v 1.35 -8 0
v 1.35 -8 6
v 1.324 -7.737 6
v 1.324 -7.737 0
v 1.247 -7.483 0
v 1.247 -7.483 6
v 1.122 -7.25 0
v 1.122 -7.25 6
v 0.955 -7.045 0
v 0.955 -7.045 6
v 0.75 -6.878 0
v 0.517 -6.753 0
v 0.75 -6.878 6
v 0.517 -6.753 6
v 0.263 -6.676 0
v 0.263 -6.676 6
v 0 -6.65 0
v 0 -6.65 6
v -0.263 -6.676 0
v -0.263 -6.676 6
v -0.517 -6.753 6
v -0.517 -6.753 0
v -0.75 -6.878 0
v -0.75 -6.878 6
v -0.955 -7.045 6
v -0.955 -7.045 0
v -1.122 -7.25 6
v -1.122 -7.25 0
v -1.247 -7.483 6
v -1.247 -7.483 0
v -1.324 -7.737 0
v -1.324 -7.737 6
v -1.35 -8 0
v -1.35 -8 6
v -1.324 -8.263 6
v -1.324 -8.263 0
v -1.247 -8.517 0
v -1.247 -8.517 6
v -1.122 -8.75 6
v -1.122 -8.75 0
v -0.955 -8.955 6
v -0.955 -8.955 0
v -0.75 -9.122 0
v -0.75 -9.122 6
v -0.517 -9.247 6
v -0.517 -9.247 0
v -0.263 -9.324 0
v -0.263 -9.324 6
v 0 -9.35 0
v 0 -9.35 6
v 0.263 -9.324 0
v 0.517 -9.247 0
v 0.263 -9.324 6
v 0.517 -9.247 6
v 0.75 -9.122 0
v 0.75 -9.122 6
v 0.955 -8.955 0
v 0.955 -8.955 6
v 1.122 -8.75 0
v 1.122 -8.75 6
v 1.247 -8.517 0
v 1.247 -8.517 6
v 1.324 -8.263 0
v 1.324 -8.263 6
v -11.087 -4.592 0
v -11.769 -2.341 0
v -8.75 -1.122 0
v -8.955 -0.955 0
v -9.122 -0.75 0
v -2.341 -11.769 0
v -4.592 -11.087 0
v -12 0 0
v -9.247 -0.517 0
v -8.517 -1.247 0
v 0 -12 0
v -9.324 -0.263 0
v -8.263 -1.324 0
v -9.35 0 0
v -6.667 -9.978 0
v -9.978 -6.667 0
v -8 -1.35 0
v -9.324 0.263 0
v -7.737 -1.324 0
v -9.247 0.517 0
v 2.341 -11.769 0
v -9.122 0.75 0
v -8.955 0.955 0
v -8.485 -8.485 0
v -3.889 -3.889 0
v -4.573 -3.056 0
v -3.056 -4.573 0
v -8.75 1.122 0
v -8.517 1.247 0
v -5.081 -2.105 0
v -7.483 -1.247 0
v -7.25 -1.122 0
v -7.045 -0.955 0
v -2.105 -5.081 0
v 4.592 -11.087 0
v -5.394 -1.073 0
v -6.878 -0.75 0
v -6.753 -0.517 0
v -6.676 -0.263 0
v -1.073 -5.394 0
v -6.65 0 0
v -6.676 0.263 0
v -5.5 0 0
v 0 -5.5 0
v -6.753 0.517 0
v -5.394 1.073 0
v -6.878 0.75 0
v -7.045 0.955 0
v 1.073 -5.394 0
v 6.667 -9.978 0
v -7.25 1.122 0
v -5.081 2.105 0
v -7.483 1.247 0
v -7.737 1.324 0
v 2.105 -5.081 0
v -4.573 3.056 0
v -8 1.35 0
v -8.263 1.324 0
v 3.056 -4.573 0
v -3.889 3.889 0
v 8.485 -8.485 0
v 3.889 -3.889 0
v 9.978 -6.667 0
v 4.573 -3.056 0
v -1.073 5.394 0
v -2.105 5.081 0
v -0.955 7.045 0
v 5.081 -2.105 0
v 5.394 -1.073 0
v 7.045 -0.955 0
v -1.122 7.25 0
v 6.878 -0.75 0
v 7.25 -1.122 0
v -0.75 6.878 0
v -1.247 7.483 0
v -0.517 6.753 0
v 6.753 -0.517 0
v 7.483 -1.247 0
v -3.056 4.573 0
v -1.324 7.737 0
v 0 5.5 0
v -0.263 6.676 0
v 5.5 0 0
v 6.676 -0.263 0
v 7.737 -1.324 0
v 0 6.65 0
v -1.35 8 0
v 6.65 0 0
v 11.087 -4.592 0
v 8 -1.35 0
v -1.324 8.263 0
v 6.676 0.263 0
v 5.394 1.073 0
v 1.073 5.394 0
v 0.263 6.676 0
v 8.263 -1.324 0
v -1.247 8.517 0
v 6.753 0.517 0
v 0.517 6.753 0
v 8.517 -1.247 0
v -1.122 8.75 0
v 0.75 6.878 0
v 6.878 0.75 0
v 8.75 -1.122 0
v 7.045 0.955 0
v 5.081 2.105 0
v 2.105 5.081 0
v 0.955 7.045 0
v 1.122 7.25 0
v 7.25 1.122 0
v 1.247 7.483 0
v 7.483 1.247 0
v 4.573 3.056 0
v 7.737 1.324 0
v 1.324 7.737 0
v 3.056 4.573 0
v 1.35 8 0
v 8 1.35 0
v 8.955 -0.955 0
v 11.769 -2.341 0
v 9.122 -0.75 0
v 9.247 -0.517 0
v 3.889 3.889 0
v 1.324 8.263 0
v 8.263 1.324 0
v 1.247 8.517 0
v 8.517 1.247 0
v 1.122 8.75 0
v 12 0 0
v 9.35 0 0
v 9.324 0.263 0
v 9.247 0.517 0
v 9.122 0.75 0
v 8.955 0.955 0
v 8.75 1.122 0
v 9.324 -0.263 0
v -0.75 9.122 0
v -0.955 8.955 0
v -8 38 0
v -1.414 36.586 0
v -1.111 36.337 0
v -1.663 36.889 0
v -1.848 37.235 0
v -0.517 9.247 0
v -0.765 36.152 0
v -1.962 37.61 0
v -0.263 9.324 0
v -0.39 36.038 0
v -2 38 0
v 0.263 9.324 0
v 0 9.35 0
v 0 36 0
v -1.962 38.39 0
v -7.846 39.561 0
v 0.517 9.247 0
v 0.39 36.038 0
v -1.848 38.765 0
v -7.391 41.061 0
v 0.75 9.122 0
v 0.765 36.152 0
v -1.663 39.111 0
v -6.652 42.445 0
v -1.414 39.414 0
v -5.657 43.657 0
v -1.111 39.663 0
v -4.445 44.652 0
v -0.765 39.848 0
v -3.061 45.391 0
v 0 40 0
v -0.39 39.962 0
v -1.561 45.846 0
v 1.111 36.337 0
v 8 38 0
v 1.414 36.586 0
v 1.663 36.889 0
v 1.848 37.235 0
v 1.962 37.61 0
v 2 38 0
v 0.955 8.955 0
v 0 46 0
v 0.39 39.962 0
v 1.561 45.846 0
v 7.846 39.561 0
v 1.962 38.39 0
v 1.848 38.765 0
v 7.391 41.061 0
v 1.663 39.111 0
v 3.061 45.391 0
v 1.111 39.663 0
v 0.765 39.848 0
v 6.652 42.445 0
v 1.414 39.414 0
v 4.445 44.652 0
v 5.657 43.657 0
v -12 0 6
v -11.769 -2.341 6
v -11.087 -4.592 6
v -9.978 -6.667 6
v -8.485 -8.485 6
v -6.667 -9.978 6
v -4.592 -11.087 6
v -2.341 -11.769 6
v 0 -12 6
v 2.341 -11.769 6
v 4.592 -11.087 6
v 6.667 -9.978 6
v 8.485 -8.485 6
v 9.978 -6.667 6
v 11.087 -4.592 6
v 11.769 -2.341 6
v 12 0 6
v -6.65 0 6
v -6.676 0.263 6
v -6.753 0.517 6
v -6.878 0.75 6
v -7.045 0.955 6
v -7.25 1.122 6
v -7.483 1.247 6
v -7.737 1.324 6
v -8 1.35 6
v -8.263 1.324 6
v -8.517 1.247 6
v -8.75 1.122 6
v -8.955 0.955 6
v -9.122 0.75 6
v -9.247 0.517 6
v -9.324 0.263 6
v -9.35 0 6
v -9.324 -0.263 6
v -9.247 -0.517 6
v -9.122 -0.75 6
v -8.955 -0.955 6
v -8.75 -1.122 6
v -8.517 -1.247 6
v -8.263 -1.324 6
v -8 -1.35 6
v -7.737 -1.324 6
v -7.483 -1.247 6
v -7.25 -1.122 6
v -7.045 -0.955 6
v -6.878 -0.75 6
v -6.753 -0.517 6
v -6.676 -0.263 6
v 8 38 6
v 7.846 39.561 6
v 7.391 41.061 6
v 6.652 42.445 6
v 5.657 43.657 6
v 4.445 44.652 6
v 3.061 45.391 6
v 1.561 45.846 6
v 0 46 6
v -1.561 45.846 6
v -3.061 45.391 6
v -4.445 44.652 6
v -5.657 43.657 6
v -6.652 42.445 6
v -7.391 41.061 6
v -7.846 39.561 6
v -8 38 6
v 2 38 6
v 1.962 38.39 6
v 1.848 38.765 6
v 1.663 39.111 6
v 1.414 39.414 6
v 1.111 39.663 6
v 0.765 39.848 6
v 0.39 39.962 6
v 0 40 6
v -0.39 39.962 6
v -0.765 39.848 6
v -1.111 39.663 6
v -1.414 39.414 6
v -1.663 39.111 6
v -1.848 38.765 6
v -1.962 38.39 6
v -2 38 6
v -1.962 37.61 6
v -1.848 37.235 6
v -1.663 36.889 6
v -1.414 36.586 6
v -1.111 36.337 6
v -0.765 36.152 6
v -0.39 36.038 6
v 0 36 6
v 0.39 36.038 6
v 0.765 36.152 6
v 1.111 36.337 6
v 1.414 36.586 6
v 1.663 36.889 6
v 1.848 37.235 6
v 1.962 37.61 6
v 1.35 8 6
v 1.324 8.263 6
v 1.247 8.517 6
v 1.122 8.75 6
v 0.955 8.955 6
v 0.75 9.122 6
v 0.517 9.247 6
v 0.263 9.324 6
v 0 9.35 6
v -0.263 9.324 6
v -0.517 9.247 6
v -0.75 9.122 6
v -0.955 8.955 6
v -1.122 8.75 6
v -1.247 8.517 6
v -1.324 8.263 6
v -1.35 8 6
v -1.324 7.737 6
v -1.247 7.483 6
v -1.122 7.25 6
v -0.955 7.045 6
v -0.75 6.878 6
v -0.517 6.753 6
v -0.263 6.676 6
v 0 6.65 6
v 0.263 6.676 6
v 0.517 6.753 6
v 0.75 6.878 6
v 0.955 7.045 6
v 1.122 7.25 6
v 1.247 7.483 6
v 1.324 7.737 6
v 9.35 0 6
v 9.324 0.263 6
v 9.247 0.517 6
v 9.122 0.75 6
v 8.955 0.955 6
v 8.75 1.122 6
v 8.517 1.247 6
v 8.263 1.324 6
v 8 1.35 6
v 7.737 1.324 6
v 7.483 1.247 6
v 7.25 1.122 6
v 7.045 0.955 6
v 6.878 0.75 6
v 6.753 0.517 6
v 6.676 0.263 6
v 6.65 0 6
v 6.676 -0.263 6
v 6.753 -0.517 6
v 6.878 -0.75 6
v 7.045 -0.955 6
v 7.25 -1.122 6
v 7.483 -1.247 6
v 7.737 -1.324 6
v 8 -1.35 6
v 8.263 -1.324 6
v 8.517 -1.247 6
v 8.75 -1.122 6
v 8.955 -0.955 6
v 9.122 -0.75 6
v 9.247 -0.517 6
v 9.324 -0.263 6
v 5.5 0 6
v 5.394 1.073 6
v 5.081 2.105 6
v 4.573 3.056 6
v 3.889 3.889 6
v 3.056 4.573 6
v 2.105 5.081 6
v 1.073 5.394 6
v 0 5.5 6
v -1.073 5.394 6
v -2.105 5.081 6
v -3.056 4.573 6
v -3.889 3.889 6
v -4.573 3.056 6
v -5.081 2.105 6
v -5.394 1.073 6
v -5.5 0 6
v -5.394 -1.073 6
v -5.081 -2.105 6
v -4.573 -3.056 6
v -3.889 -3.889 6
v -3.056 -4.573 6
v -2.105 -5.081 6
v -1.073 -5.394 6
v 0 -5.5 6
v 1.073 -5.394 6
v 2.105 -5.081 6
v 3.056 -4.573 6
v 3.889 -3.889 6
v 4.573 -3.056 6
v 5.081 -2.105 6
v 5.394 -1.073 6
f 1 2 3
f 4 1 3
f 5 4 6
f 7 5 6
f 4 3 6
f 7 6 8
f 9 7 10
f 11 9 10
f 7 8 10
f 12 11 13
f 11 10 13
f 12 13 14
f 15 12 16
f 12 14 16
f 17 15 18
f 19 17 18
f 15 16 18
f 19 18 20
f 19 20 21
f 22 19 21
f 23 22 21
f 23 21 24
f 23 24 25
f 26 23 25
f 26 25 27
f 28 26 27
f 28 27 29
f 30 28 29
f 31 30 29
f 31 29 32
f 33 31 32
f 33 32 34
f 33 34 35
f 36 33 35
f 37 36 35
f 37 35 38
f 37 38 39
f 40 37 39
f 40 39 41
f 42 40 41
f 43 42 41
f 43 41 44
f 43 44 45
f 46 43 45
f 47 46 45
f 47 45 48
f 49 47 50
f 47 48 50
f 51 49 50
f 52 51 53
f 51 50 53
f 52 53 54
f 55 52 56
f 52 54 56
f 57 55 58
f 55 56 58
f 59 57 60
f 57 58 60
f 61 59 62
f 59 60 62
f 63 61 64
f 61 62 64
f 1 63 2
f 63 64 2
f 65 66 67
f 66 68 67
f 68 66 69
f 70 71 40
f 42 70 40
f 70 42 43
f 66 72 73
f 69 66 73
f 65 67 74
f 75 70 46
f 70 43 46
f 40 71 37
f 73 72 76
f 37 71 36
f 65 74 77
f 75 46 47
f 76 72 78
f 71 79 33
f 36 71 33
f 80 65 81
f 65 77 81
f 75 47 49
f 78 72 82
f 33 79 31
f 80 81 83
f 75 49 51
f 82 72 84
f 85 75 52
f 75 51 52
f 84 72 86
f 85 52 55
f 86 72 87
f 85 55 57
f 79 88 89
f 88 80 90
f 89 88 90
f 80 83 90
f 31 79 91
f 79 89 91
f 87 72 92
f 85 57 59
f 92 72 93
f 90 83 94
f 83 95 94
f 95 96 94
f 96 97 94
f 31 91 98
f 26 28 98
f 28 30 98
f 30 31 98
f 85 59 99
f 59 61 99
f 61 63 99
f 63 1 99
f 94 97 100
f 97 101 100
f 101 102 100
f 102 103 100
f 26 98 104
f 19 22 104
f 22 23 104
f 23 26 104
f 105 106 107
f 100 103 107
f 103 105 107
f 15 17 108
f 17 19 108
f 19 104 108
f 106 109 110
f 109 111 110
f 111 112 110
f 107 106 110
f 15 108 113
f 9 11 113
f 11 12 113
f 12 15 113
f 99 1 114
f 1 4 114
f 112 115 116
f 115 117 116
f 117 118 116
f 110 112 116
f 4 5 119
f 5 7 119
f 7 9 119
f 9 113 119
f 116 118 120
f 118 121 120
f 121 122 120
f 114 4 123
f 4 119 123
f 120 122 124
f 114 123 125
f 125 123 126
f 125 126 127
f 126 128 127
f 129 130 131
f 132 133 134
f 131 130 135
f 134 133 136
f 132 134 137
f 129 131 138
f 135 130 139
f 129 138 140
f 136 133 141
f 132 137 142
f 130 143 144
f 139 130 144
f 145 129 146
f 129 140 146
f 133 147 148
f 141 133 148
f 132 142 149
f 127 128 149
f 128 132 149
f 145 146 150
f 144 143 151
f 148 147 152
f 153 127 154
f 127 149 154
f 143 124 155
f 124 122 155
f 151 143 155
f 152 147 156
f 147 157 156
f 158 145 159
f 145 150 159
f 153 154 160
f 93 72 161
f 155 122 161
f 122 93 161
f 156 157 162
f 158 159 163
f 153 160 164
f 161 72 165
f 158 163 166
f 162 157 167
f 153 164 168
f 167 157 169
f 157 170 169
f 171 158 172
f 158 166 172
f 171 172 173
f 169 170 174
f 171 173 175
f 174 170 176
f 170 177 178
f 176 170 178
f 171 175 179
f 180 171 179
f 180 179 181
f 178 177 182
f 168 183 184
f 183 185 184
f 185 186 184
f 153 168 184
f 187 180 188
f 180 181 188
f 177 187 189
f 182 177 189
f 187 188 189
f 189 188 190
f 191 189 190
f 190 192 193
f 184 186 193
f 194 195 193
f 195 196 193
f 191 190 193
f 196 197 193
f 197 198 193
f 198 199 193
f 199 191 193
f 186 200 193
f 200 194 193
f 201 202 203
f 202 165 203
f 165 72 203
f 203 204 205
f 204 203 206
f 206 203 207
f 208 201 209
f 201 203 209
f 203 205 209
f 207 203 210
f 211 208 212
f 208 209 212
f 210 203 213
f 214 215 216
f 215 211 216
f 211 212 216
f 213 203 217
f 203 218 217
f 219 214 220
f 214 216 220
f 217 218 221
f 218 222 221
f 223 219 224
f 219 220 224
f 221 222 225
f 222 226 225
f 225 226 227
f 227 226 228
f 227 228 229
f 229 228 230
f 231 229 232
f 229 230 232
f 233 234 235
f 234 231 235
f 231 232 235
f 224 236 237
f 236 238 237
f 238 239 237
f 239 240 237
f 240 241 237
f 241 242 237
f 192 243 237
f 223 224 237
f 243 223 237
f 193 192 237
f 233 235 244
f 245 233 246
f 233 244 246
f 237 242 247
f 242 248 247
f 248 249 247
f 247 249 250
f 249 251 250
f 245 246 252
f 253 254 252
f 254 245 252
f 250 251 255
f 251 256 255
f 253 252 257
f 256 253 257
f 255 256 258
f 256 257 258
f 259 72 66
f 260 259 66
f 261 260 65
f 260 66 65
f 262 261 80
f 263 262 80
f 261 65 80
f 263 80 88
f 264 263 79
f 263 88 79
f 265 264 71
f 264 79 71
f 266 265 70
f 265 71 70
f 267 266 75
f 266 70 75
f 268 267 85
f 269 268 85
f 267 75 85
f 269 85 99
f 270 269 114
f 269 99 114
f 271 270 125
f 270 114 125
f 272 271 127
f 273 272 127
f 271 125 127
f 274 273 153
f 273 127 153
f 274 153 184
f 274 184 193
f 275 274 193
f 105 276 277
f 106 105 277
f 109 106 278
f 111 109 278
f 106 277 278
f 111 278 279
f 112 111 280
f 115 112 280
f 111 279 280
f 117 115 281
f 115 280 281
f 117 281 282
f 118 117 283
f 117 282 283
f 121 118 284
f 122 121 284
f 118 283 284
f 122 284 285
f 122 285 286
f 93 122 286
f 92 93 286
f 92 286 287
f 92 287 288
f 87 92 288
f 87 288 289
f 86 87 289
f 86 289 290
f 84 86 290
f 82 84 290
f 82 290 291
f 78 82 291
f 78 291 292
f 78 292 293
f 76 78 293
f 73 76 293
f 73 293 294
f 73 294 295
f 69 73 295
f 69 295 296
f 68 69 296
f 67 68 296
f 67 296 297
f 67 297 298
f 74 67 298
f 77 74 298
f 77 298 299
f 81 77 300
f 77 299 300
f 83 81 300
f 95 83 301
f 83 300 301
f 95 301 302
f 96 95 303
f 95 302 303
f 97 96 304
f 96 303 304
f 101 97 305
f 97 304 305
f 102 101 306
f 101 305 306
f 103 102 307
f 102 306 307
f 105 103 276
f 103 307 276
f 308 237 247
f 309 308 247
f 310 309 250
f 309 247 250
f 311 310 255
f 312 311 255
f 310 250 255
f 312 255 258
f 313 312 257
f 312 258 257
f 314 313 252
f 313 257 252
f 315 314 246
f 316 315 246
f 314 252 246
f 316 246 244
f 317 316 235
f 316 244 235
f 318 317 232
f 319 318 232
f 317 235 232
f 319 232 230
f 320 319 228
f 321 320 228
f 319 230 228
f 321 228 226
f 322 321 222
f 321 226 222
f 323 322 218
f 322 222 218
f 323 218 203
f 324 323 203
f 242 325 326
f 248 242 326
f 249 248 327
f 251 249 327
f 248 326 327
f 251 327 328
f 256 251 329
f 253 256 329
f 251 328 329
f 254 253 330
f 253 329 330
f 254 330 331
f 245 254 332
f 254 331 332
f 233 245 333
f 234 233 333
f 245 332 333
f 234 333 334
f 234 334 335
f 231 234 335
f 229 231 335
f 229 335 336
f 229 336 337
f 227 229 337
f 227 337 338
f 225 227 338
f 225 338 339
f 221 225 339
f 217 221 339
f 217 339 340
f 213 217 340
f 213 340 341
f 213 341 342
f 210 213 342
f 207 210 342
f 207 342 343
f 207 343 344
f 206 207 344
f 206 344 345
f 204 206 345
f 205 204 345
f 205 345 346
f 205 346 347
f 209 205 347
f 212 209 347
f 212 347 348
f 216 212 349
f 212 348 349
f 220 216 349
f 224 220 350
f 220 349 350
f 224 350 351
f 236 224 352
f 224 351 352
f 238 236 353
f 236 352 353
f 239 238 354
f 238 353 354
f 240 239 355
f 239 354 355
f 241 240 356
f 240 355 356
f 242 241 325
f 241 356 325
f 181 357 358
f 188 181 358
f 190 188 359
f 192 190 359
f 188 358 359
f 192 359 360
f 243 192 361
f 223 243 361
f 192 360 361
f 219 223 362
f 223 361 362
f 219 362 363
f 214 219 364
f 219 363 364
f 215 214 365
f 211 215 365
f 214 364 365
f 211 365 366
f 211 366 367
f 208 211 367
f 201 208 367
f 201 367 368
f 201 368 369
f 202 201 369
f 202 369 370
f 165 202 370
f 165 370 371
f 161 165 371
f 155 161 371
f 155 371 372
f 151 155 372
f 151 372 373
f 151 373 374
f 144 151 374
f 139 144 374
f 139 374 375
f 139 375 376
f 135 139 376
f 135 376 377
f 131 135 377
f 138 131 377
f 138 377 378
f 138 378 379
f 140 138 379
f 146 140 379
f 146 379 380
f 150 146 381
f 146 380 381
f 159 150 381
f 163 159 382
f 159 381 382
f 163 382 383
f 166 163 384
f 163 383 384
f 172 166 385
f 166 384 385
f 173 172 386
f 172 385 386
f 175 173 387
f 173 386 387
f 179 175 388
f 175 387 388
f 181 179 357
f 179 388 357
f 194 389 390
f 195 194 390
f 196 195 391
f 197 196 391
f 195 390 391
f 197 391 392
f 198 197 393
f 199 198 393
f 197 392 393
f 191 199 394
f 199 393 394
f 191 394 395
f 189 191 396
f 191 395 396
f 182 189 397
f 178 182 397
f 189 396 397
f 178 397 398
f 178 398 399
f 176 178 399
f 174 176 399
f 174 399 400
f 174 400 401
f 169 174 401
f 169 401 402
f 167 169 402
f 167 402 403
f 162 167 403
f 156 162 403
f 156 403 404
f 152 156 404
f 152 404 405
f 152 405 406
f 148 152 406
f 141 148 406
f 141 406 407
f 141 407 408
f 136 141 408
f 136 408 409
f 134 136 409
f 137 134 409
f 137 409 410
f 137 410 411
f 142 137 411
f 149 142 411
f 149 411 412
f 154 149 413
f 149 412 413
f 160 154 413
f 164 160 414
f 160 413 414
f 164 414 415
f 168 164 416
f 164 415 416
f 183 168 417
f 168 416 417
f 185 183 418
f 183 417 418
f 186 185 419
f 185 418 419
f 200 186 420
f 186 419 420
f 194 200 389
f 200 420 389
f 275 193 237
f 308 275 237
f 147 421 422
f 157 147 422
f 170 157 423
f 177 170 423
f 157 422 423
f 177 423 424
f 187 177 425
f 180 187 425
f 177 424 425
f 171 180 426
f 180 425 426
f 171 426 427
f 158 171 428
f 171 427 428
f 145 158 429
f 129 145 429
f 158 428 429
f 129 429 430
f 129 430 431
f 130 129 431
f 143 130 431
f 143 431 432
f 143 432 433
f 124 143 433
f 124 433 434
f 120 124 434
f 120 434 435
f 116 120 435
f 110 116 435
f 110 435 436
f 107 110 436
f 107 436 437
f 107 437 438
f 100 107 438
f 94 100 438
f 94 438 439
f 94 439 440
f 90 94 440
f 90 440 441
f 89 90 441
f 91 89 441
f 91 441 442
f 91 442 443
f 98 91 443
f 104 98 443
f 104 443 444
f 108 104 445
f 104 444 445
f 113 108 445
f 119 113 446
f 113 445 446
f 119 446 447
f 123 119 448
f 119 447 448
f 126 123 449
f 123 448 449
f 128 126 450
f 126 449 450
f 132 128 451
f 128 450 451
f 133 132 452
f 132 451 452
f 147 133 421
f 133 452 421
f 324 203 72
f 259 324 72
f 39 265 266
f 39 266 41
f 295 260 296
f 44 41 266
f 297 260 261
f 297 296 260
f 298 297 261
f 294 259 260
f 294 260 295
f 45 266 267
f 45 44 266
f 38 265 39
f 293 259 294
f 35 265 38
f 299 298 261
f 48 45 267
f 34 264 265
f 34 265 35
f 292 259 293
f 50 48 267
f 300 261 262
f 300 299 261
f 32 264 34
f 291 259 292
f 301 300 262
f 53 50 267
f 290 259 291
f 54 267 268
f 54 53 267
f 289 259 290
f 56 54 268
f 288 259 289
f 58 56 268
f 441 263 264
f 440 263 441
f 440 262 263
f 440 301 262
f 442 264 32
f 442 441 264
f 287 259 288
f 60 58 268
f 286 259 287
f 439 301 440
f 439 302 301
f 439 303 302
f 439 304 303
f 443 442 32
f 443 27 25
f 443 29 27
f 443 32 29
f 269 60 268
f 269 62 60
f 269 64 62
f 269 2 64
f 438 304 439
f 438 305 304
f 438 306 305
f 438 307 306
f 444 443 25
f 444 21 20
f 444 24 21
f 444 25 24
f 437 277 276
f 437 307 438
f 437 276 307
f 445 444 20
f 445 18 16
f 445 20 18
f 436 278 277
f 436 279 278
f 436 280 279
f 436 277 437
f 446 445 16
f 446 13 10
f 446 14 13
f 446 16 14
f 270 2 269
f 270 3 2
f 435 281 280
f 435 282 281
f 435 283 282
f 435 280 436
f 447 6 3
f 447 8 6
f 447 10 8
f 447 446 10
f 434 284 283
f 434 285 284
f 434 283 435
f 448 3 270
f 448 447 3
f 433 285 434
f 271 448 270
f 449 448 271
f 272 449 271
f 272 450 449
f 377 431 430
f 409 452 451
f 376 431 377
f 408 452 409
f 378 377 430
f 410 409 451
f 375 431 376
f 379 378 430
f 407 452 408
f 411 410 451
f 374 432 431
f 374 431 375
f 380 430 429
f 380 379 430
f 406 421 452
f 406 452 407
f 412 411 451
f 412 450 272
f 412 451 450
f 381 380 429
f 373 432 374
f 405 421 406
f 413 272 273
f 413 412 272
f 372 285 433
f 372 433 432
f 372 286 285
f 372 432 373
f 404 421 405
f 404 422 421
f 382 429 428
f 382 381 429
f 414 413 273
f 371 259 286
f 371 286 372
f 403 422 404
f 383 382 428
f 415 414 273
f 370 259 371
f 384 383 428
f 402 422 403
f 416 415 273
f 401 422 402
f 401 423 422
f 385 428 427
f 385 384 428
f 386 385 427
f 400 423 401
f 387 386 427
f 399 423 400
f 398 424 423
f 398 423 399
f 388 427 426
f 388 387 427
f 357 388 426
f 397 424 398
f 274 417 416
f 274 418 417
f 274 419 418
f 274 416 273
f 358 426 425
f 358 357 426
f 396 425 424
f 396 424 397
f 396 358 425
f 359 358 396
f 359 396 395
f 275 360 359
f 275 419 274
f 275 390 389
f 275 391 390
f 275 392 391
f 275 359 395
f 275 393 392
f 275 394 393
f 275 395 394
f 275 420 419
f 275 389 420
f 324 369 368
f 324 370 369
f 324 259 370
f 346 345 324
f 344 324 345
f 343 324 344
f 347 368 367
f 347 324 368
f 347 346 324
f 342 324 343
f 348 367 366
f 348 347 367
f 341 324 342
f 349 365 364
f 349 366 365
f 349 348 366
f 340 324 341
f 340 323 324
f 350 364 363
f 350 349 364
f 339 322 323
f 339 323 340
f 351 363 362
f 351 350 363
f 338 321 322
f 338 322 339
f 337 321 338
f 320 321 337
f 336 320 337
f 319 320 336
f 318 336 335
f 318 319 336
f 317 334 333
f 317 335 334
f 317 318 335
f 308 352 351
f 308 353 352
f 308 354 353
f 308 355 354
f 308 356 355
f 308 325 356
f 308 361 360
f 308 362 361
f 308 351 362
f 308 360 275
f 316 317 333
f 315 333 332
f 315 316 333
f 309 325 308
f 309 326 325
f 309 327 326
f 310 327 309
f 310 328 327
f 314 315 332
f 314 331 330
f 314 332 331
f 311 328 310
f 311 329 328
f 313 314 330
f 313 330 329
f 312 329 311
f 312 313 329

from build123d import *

# Parameters (mm, degrees)
BOSS_EXTRU_1_DEPTH           = 6
ESQUISSE2_R                  = 5.5
ESQUISSE2_R_2                = 1.35
ESQUISSE2_R_3                = 2
ENL_V_MAT_EXTRU_1_DEPTH      = 1
ENL_V_MAT_EXTRU_1_DEPTH_BACK = 7


with BuildPart() as part:
    # Esquisse1 → Boss.-Extru.1 (new body)
    with BuildSketch(Plane.XY):
        with BuildLine():
            Line((12, 0), (8, 38))
            ThreePointArc((8, 38), (0, 46), (-8, 38))
            Line((-8, 38), (-12, 0))
            ThreePointArc((-12, 0), (0, -12), (12, 0))
        make_face()
    extrude(amount=BOSS_EXTRU_1_DEPTH)

    # Esquisse2 → Enlèv. mat.-Extru.1 (cut, two sides)
    with BuildSketch(Plane.XY.offset(6)) as enl_v_mat_extru_1_sk:
        Circle(ESQUISSE2_R)
        with Locations((8, 0)):
            Circle(ESQUISSE2_R_2)
        with Locations((0, -8)):
            Circle(ESQUISSE2_R_2)
        with Locations((-8, 0)):
            Circle(ESQUISSE2_R_2)
        with Locations((0, 8)):
            Circle(ESQUISSE2_R_2)
        with Locations((0, 38)):
            Circle(ESQUISSE2_R_3)
    extrude(amount=ENL_V_MAT_EXTRU_1_DEPTH, mode=Mode.SUBTRACT)
    extrude(enl_v_mat_extru_1_sk.sketch, amount=-ENL_V_MAT_EXTRU_1_DEPTH_BACK, mode=Mode.SUBTRACT)


solid = part.part
